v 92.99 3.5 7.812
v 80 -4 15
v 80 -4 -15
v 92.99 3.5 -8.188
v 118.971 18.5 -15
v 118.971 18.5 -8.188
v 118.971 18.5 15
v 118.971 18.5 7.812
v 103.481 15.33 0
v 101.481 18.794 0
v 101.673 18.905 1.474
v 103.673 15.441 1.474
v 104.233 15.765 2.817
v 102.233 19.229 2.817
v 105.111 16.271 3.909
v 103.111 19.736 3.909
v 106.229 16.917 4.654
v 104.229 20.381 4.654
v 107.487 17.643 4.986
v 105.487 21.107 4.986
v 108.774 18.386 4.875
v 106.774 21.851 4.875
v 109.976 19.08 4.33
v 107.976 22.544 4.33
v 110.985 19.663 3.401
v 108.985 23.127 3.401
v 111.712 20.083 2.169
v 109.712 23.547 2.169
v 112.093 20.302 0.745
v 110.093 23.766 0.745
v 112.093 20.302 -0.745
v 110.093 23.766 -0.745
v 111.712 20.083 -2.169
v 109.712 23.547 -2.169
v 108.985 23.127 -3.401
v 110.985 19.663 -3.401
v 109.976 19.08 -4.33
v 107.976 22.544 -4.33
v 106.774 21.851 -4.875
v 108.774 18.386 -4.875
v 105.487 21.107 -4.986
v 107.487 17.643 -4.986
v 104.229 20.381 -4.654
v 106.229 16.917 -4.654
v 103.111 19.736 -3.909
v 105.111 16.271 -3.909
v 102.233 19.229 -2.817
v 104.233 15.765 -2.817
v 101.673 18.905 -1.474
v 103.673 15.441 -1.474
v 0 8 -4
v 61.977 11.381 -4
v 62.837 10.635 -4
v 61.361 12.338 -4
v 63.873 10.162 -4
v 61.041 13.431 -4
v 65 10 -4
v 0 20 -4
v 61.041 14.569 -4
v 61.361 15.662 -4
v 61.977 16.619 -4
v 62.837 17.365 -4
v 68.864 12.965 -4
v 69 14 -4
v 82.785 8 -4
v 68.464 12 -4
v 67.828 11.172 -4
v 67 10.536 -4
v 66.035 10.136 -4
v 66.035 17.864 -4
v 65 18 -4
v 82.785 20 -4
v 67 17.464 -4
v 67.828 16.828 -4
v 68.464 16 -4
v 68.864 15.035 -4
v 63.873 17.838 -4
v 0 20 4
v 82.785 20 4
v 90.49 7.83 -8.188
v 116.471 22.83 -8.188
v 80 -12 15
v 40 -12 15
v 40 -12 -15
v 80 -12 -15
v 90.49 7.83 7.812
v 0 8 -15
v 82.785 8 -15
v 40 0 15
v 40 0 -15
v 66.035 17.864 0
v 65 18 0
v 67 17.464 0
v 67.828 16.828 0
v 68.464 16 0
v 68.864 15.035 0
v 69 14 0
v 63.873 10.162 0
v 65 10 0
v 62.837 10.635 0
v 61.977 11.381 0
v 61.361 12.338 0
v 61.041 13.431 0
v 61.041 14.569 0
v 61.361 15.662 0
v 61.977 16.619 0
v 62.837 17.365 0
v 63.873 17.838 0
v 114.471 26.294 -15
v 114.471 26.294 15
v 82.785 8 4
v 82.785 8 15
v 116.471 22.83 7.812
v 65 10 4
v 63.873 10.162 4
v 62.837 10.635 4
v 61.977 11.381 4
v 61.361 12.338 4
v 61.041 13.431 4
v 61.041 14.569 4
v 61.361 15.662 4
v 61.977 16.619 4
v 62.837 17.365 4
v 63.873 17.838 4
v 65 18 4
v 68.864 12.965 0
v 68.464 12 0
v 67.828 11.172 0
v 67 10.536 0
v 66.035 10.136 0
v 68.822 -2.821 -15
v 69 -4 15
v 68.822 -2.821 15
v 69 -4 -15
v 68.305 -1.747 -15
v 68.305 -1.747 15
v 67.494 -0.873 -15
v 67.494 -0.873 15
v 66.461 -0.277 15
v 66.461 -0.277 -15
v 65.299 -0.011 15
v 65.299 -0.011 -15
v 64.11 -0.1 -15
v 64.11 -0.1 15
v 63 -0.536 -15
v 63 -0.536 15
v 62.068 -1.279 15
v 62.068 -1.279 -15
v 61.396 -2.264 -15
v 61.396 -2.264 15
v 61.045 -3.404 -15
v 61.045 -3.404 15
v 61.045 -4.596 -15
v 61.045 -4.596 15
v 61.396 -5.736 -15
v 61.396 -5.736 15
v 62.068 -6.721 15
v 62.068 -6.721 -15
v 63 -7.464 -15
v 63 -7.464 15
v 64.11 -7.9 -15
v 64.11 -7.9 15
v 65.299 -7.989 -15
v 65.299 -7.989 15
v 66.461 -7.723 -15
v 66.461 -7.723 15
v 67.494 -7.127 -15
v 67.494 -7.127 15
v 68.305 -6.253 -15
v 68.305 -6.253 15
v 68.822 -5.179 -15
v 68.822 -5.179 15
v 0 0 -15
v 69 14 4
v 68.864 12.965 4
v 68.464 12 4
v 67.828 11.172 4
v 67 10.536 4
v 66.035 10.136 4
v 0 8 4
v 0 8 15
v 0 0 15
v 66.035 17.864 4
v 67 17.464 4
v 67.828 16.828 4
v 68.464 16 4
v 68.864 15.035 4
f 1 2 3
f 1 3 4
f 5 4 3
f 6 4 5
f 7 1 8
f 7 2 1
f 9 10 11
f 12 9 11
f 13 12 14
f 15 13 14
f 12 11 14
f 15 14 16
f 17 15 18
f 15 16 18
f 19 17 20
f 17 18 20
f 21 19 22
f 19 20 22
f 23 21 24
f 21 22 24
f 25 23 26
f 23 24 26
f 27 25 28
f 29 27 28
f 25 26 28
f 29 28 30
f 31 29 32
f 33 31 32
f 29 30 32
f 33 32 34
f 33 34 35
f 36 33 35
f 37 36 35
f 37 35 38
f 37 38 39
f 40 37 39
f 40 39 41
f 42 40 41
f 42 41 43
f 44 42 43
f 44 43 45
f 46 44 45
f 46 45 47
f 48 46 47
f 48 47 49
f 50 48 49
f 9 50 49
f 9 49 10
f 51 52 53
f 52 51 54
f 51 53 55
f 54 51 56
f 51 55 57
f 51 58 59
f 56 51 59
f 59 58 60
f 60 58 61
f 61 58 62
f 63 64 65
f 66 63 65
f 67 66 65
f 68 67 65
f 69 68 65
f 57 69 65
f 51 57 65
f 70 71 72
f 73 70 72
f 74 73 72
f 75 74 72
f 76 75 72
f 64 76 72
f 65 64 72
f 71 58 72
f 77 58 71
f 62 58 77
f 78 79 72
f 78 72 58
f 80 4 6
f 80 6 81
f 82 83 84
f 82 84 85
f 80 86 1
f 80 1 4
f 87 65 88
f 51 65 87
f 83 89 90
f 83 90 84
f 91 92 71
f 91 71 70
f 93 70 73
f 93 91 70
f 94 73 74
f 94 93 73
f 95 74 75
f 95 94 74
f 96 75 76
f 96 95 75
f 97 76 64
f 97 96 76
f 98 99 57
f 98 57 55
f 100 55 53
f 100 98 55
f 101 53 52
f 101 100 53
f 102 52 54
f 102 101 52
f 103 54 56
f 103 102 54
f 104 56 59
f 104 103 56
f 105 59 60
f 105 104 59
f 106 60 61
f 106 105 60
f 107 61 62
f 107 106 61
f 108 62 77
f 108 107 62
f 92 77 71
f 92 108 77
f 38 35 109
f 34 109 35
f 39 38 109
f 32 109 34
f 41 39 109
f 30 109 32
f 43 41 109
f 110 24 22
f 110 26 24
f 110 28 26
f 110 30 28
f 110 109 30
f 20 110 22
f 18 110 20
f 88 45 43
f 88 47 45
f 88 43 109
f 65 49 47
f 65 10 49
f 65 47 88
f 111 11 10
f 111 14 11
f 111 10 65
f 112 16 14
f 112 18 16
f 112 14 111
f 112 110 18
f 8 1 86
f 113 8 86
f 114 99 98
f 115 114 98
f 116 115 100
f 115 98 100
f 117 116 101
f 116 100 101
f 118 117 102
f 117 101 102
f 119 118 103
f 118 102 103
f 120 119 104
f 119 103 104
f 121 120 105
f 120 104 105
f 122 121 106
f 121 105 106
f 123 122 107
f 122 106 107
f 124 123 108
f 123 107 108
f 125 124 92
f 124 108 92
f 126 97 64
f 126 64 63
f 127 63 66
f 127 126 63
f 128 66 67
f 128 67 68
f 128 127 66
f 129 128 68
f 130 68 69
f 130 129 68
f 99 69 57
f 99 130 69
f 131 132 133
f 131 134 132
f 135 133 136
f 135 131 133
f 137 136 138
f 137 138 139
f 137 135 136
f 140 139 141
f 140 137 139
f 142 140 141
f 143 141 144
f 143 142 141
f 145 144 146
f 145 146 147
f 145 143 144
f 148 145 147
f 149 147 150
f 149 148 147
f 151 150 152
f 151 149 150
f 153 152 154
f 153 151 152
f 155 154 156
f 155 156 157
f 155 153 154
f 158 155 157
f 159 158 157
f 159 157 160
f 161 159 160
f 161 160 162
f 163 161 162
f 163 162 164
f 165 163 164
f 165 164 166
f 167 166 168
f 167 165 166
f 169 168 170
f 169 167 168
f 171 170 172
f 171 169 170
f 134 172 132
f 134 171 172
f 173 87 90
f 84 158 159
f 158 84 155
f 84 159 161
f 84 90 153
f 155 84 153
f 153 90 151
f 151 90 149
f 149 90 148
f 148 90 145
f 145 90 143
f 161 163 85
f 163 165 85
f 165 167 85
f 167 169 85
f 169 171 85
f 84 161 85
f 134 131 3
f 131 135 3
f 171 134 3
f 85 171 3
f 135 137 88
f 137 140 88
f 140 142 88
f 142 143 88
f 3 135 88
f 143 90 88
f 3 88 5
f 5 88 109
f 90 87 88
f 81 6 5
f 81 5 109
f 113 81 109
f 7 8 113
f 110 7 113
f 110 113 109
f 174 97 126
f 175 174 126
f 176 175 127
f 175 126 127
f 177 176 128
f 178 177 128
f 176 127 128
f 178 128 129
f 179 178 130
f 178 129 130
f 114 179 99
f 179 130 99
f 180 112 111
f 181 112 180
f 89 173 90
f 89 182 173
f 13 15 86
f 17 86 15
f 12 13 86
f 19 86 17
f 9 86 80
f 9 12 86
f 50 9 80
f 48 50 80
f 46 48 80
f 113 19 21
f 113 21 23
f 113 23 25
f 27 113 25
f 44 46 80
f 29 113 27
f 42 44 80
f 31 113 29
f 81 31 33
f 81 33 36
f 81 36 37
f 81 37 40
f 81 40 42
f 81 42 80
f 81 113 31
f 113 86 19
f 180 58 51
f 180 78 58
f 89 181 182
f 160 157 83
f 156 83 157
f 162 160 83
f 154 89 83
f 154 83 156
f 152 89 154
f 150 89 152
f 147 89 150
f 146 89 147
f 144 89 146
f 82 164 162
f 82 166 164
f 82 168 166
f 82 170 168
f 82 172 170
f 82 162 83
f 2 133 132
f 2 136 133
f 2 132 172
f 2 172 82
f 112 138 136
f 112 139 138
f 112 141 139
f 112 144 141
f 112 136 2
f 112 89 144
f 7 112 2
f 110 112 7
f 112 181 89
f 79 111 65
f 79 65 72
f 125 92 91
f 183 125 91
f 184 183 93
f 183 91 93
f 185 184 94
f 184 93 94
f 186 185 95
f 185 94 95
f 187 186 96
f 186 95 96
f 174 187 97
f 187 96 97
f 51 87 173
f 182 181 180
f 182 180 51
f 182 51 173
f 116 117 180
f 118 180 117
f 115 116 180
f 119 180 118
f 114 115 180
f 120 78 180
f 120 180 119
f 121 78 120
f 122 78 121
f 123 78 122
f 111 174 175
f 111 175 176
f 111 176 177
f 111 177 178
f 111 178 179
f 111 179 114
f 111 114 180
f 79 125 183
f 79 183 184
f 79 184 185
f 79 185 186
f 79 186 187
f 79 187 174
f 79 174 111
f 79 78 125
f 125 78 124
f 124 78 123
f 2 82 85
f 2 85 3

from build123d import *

# Parameters (mm, degrees)
SKETCH_1_R           = 4
EXTRUDE_4_DEPTH      = 15
SKETCH_1_15_W        = 82.784609691
SKETCH_1_15_H        = 12
SKETCH_1_15_R        = 4
EXTRUDE_5_DEPTH      = 4
SKETCH_15_R          = 5
CUT_EXTRUDE_9_DEPTH  = 118.165082722
SKETCH_16_W          = 16
SKETCH_16_H          = 5
CUT_EXTRUDE_10_DEPTH = 30


with BuildPart() as part:
    # 스케치1 → 보스-돌출4 (new, symmetric)
    with BuildSketch(Plane.XY):
        Polygon((0, 8), (0, 0), (40, 0), (40, -12), (80, -12), (80, -4), (118.97114317, 18.5), (114.47114317, 26.294228634), (82.784609691, 8), align=None)
        with Locations((65, -4)):
            Circle(SKETCH_1_R, mode=Mode.SUBTRACT)
    extrude(amount=EXTRUDE_4_DEPTH, both=True)

    # 스케치1<15> → 보스-돌출5 (add, symmetric)
    with BuildSketch(Plane.XY):
        with Locations((41.392304845, 14)):
            Rectangle(SKETCH_1_15_W, SKETCH_1_15_H)
        with Locations((65, 14)):
            Circle(SKETCH_1_15_R, mode=Mode.SUBTRACT)
    extrude(amount=EXTRUDE_5_DEPTH, both=True)

    # 스케치15 → 컷-돌출9 (cut, through all)
    with BuildSketch(Plane(origin=(17.232050808, -29.846787517, 0), x_dir=(0.8660254037844362, 0.5000000000000044, 0), z_dir=(-0.5000000000000044, 0.8660254037844362, 0))):
        with Locations((102.282032303, 0)):
            Circle(SKETCH_15_R)
    extrude(amount=-CUT_EXTRUDE_9_DEPTH, mode=Mode.SUBTRACT)

    # 스케치16 → 컷-돌출10 (cut)
    with BuildSketch(Plane(origin=(97.239092363, 56.141016151, 0), x_dir=(0, 0, -1), z_dir=(0.8660254037844364, 0.5000000000000041, 0))):
        with Locations((0.188244246, -40.964101615)):
            Rectangle(SKETCH_16_W, SKETCH_16_H)
    extrude(amount=-CUT_EXTRUDE_10_DEPTH, mode=Mode.SUBTRACT)


solid = part.part
